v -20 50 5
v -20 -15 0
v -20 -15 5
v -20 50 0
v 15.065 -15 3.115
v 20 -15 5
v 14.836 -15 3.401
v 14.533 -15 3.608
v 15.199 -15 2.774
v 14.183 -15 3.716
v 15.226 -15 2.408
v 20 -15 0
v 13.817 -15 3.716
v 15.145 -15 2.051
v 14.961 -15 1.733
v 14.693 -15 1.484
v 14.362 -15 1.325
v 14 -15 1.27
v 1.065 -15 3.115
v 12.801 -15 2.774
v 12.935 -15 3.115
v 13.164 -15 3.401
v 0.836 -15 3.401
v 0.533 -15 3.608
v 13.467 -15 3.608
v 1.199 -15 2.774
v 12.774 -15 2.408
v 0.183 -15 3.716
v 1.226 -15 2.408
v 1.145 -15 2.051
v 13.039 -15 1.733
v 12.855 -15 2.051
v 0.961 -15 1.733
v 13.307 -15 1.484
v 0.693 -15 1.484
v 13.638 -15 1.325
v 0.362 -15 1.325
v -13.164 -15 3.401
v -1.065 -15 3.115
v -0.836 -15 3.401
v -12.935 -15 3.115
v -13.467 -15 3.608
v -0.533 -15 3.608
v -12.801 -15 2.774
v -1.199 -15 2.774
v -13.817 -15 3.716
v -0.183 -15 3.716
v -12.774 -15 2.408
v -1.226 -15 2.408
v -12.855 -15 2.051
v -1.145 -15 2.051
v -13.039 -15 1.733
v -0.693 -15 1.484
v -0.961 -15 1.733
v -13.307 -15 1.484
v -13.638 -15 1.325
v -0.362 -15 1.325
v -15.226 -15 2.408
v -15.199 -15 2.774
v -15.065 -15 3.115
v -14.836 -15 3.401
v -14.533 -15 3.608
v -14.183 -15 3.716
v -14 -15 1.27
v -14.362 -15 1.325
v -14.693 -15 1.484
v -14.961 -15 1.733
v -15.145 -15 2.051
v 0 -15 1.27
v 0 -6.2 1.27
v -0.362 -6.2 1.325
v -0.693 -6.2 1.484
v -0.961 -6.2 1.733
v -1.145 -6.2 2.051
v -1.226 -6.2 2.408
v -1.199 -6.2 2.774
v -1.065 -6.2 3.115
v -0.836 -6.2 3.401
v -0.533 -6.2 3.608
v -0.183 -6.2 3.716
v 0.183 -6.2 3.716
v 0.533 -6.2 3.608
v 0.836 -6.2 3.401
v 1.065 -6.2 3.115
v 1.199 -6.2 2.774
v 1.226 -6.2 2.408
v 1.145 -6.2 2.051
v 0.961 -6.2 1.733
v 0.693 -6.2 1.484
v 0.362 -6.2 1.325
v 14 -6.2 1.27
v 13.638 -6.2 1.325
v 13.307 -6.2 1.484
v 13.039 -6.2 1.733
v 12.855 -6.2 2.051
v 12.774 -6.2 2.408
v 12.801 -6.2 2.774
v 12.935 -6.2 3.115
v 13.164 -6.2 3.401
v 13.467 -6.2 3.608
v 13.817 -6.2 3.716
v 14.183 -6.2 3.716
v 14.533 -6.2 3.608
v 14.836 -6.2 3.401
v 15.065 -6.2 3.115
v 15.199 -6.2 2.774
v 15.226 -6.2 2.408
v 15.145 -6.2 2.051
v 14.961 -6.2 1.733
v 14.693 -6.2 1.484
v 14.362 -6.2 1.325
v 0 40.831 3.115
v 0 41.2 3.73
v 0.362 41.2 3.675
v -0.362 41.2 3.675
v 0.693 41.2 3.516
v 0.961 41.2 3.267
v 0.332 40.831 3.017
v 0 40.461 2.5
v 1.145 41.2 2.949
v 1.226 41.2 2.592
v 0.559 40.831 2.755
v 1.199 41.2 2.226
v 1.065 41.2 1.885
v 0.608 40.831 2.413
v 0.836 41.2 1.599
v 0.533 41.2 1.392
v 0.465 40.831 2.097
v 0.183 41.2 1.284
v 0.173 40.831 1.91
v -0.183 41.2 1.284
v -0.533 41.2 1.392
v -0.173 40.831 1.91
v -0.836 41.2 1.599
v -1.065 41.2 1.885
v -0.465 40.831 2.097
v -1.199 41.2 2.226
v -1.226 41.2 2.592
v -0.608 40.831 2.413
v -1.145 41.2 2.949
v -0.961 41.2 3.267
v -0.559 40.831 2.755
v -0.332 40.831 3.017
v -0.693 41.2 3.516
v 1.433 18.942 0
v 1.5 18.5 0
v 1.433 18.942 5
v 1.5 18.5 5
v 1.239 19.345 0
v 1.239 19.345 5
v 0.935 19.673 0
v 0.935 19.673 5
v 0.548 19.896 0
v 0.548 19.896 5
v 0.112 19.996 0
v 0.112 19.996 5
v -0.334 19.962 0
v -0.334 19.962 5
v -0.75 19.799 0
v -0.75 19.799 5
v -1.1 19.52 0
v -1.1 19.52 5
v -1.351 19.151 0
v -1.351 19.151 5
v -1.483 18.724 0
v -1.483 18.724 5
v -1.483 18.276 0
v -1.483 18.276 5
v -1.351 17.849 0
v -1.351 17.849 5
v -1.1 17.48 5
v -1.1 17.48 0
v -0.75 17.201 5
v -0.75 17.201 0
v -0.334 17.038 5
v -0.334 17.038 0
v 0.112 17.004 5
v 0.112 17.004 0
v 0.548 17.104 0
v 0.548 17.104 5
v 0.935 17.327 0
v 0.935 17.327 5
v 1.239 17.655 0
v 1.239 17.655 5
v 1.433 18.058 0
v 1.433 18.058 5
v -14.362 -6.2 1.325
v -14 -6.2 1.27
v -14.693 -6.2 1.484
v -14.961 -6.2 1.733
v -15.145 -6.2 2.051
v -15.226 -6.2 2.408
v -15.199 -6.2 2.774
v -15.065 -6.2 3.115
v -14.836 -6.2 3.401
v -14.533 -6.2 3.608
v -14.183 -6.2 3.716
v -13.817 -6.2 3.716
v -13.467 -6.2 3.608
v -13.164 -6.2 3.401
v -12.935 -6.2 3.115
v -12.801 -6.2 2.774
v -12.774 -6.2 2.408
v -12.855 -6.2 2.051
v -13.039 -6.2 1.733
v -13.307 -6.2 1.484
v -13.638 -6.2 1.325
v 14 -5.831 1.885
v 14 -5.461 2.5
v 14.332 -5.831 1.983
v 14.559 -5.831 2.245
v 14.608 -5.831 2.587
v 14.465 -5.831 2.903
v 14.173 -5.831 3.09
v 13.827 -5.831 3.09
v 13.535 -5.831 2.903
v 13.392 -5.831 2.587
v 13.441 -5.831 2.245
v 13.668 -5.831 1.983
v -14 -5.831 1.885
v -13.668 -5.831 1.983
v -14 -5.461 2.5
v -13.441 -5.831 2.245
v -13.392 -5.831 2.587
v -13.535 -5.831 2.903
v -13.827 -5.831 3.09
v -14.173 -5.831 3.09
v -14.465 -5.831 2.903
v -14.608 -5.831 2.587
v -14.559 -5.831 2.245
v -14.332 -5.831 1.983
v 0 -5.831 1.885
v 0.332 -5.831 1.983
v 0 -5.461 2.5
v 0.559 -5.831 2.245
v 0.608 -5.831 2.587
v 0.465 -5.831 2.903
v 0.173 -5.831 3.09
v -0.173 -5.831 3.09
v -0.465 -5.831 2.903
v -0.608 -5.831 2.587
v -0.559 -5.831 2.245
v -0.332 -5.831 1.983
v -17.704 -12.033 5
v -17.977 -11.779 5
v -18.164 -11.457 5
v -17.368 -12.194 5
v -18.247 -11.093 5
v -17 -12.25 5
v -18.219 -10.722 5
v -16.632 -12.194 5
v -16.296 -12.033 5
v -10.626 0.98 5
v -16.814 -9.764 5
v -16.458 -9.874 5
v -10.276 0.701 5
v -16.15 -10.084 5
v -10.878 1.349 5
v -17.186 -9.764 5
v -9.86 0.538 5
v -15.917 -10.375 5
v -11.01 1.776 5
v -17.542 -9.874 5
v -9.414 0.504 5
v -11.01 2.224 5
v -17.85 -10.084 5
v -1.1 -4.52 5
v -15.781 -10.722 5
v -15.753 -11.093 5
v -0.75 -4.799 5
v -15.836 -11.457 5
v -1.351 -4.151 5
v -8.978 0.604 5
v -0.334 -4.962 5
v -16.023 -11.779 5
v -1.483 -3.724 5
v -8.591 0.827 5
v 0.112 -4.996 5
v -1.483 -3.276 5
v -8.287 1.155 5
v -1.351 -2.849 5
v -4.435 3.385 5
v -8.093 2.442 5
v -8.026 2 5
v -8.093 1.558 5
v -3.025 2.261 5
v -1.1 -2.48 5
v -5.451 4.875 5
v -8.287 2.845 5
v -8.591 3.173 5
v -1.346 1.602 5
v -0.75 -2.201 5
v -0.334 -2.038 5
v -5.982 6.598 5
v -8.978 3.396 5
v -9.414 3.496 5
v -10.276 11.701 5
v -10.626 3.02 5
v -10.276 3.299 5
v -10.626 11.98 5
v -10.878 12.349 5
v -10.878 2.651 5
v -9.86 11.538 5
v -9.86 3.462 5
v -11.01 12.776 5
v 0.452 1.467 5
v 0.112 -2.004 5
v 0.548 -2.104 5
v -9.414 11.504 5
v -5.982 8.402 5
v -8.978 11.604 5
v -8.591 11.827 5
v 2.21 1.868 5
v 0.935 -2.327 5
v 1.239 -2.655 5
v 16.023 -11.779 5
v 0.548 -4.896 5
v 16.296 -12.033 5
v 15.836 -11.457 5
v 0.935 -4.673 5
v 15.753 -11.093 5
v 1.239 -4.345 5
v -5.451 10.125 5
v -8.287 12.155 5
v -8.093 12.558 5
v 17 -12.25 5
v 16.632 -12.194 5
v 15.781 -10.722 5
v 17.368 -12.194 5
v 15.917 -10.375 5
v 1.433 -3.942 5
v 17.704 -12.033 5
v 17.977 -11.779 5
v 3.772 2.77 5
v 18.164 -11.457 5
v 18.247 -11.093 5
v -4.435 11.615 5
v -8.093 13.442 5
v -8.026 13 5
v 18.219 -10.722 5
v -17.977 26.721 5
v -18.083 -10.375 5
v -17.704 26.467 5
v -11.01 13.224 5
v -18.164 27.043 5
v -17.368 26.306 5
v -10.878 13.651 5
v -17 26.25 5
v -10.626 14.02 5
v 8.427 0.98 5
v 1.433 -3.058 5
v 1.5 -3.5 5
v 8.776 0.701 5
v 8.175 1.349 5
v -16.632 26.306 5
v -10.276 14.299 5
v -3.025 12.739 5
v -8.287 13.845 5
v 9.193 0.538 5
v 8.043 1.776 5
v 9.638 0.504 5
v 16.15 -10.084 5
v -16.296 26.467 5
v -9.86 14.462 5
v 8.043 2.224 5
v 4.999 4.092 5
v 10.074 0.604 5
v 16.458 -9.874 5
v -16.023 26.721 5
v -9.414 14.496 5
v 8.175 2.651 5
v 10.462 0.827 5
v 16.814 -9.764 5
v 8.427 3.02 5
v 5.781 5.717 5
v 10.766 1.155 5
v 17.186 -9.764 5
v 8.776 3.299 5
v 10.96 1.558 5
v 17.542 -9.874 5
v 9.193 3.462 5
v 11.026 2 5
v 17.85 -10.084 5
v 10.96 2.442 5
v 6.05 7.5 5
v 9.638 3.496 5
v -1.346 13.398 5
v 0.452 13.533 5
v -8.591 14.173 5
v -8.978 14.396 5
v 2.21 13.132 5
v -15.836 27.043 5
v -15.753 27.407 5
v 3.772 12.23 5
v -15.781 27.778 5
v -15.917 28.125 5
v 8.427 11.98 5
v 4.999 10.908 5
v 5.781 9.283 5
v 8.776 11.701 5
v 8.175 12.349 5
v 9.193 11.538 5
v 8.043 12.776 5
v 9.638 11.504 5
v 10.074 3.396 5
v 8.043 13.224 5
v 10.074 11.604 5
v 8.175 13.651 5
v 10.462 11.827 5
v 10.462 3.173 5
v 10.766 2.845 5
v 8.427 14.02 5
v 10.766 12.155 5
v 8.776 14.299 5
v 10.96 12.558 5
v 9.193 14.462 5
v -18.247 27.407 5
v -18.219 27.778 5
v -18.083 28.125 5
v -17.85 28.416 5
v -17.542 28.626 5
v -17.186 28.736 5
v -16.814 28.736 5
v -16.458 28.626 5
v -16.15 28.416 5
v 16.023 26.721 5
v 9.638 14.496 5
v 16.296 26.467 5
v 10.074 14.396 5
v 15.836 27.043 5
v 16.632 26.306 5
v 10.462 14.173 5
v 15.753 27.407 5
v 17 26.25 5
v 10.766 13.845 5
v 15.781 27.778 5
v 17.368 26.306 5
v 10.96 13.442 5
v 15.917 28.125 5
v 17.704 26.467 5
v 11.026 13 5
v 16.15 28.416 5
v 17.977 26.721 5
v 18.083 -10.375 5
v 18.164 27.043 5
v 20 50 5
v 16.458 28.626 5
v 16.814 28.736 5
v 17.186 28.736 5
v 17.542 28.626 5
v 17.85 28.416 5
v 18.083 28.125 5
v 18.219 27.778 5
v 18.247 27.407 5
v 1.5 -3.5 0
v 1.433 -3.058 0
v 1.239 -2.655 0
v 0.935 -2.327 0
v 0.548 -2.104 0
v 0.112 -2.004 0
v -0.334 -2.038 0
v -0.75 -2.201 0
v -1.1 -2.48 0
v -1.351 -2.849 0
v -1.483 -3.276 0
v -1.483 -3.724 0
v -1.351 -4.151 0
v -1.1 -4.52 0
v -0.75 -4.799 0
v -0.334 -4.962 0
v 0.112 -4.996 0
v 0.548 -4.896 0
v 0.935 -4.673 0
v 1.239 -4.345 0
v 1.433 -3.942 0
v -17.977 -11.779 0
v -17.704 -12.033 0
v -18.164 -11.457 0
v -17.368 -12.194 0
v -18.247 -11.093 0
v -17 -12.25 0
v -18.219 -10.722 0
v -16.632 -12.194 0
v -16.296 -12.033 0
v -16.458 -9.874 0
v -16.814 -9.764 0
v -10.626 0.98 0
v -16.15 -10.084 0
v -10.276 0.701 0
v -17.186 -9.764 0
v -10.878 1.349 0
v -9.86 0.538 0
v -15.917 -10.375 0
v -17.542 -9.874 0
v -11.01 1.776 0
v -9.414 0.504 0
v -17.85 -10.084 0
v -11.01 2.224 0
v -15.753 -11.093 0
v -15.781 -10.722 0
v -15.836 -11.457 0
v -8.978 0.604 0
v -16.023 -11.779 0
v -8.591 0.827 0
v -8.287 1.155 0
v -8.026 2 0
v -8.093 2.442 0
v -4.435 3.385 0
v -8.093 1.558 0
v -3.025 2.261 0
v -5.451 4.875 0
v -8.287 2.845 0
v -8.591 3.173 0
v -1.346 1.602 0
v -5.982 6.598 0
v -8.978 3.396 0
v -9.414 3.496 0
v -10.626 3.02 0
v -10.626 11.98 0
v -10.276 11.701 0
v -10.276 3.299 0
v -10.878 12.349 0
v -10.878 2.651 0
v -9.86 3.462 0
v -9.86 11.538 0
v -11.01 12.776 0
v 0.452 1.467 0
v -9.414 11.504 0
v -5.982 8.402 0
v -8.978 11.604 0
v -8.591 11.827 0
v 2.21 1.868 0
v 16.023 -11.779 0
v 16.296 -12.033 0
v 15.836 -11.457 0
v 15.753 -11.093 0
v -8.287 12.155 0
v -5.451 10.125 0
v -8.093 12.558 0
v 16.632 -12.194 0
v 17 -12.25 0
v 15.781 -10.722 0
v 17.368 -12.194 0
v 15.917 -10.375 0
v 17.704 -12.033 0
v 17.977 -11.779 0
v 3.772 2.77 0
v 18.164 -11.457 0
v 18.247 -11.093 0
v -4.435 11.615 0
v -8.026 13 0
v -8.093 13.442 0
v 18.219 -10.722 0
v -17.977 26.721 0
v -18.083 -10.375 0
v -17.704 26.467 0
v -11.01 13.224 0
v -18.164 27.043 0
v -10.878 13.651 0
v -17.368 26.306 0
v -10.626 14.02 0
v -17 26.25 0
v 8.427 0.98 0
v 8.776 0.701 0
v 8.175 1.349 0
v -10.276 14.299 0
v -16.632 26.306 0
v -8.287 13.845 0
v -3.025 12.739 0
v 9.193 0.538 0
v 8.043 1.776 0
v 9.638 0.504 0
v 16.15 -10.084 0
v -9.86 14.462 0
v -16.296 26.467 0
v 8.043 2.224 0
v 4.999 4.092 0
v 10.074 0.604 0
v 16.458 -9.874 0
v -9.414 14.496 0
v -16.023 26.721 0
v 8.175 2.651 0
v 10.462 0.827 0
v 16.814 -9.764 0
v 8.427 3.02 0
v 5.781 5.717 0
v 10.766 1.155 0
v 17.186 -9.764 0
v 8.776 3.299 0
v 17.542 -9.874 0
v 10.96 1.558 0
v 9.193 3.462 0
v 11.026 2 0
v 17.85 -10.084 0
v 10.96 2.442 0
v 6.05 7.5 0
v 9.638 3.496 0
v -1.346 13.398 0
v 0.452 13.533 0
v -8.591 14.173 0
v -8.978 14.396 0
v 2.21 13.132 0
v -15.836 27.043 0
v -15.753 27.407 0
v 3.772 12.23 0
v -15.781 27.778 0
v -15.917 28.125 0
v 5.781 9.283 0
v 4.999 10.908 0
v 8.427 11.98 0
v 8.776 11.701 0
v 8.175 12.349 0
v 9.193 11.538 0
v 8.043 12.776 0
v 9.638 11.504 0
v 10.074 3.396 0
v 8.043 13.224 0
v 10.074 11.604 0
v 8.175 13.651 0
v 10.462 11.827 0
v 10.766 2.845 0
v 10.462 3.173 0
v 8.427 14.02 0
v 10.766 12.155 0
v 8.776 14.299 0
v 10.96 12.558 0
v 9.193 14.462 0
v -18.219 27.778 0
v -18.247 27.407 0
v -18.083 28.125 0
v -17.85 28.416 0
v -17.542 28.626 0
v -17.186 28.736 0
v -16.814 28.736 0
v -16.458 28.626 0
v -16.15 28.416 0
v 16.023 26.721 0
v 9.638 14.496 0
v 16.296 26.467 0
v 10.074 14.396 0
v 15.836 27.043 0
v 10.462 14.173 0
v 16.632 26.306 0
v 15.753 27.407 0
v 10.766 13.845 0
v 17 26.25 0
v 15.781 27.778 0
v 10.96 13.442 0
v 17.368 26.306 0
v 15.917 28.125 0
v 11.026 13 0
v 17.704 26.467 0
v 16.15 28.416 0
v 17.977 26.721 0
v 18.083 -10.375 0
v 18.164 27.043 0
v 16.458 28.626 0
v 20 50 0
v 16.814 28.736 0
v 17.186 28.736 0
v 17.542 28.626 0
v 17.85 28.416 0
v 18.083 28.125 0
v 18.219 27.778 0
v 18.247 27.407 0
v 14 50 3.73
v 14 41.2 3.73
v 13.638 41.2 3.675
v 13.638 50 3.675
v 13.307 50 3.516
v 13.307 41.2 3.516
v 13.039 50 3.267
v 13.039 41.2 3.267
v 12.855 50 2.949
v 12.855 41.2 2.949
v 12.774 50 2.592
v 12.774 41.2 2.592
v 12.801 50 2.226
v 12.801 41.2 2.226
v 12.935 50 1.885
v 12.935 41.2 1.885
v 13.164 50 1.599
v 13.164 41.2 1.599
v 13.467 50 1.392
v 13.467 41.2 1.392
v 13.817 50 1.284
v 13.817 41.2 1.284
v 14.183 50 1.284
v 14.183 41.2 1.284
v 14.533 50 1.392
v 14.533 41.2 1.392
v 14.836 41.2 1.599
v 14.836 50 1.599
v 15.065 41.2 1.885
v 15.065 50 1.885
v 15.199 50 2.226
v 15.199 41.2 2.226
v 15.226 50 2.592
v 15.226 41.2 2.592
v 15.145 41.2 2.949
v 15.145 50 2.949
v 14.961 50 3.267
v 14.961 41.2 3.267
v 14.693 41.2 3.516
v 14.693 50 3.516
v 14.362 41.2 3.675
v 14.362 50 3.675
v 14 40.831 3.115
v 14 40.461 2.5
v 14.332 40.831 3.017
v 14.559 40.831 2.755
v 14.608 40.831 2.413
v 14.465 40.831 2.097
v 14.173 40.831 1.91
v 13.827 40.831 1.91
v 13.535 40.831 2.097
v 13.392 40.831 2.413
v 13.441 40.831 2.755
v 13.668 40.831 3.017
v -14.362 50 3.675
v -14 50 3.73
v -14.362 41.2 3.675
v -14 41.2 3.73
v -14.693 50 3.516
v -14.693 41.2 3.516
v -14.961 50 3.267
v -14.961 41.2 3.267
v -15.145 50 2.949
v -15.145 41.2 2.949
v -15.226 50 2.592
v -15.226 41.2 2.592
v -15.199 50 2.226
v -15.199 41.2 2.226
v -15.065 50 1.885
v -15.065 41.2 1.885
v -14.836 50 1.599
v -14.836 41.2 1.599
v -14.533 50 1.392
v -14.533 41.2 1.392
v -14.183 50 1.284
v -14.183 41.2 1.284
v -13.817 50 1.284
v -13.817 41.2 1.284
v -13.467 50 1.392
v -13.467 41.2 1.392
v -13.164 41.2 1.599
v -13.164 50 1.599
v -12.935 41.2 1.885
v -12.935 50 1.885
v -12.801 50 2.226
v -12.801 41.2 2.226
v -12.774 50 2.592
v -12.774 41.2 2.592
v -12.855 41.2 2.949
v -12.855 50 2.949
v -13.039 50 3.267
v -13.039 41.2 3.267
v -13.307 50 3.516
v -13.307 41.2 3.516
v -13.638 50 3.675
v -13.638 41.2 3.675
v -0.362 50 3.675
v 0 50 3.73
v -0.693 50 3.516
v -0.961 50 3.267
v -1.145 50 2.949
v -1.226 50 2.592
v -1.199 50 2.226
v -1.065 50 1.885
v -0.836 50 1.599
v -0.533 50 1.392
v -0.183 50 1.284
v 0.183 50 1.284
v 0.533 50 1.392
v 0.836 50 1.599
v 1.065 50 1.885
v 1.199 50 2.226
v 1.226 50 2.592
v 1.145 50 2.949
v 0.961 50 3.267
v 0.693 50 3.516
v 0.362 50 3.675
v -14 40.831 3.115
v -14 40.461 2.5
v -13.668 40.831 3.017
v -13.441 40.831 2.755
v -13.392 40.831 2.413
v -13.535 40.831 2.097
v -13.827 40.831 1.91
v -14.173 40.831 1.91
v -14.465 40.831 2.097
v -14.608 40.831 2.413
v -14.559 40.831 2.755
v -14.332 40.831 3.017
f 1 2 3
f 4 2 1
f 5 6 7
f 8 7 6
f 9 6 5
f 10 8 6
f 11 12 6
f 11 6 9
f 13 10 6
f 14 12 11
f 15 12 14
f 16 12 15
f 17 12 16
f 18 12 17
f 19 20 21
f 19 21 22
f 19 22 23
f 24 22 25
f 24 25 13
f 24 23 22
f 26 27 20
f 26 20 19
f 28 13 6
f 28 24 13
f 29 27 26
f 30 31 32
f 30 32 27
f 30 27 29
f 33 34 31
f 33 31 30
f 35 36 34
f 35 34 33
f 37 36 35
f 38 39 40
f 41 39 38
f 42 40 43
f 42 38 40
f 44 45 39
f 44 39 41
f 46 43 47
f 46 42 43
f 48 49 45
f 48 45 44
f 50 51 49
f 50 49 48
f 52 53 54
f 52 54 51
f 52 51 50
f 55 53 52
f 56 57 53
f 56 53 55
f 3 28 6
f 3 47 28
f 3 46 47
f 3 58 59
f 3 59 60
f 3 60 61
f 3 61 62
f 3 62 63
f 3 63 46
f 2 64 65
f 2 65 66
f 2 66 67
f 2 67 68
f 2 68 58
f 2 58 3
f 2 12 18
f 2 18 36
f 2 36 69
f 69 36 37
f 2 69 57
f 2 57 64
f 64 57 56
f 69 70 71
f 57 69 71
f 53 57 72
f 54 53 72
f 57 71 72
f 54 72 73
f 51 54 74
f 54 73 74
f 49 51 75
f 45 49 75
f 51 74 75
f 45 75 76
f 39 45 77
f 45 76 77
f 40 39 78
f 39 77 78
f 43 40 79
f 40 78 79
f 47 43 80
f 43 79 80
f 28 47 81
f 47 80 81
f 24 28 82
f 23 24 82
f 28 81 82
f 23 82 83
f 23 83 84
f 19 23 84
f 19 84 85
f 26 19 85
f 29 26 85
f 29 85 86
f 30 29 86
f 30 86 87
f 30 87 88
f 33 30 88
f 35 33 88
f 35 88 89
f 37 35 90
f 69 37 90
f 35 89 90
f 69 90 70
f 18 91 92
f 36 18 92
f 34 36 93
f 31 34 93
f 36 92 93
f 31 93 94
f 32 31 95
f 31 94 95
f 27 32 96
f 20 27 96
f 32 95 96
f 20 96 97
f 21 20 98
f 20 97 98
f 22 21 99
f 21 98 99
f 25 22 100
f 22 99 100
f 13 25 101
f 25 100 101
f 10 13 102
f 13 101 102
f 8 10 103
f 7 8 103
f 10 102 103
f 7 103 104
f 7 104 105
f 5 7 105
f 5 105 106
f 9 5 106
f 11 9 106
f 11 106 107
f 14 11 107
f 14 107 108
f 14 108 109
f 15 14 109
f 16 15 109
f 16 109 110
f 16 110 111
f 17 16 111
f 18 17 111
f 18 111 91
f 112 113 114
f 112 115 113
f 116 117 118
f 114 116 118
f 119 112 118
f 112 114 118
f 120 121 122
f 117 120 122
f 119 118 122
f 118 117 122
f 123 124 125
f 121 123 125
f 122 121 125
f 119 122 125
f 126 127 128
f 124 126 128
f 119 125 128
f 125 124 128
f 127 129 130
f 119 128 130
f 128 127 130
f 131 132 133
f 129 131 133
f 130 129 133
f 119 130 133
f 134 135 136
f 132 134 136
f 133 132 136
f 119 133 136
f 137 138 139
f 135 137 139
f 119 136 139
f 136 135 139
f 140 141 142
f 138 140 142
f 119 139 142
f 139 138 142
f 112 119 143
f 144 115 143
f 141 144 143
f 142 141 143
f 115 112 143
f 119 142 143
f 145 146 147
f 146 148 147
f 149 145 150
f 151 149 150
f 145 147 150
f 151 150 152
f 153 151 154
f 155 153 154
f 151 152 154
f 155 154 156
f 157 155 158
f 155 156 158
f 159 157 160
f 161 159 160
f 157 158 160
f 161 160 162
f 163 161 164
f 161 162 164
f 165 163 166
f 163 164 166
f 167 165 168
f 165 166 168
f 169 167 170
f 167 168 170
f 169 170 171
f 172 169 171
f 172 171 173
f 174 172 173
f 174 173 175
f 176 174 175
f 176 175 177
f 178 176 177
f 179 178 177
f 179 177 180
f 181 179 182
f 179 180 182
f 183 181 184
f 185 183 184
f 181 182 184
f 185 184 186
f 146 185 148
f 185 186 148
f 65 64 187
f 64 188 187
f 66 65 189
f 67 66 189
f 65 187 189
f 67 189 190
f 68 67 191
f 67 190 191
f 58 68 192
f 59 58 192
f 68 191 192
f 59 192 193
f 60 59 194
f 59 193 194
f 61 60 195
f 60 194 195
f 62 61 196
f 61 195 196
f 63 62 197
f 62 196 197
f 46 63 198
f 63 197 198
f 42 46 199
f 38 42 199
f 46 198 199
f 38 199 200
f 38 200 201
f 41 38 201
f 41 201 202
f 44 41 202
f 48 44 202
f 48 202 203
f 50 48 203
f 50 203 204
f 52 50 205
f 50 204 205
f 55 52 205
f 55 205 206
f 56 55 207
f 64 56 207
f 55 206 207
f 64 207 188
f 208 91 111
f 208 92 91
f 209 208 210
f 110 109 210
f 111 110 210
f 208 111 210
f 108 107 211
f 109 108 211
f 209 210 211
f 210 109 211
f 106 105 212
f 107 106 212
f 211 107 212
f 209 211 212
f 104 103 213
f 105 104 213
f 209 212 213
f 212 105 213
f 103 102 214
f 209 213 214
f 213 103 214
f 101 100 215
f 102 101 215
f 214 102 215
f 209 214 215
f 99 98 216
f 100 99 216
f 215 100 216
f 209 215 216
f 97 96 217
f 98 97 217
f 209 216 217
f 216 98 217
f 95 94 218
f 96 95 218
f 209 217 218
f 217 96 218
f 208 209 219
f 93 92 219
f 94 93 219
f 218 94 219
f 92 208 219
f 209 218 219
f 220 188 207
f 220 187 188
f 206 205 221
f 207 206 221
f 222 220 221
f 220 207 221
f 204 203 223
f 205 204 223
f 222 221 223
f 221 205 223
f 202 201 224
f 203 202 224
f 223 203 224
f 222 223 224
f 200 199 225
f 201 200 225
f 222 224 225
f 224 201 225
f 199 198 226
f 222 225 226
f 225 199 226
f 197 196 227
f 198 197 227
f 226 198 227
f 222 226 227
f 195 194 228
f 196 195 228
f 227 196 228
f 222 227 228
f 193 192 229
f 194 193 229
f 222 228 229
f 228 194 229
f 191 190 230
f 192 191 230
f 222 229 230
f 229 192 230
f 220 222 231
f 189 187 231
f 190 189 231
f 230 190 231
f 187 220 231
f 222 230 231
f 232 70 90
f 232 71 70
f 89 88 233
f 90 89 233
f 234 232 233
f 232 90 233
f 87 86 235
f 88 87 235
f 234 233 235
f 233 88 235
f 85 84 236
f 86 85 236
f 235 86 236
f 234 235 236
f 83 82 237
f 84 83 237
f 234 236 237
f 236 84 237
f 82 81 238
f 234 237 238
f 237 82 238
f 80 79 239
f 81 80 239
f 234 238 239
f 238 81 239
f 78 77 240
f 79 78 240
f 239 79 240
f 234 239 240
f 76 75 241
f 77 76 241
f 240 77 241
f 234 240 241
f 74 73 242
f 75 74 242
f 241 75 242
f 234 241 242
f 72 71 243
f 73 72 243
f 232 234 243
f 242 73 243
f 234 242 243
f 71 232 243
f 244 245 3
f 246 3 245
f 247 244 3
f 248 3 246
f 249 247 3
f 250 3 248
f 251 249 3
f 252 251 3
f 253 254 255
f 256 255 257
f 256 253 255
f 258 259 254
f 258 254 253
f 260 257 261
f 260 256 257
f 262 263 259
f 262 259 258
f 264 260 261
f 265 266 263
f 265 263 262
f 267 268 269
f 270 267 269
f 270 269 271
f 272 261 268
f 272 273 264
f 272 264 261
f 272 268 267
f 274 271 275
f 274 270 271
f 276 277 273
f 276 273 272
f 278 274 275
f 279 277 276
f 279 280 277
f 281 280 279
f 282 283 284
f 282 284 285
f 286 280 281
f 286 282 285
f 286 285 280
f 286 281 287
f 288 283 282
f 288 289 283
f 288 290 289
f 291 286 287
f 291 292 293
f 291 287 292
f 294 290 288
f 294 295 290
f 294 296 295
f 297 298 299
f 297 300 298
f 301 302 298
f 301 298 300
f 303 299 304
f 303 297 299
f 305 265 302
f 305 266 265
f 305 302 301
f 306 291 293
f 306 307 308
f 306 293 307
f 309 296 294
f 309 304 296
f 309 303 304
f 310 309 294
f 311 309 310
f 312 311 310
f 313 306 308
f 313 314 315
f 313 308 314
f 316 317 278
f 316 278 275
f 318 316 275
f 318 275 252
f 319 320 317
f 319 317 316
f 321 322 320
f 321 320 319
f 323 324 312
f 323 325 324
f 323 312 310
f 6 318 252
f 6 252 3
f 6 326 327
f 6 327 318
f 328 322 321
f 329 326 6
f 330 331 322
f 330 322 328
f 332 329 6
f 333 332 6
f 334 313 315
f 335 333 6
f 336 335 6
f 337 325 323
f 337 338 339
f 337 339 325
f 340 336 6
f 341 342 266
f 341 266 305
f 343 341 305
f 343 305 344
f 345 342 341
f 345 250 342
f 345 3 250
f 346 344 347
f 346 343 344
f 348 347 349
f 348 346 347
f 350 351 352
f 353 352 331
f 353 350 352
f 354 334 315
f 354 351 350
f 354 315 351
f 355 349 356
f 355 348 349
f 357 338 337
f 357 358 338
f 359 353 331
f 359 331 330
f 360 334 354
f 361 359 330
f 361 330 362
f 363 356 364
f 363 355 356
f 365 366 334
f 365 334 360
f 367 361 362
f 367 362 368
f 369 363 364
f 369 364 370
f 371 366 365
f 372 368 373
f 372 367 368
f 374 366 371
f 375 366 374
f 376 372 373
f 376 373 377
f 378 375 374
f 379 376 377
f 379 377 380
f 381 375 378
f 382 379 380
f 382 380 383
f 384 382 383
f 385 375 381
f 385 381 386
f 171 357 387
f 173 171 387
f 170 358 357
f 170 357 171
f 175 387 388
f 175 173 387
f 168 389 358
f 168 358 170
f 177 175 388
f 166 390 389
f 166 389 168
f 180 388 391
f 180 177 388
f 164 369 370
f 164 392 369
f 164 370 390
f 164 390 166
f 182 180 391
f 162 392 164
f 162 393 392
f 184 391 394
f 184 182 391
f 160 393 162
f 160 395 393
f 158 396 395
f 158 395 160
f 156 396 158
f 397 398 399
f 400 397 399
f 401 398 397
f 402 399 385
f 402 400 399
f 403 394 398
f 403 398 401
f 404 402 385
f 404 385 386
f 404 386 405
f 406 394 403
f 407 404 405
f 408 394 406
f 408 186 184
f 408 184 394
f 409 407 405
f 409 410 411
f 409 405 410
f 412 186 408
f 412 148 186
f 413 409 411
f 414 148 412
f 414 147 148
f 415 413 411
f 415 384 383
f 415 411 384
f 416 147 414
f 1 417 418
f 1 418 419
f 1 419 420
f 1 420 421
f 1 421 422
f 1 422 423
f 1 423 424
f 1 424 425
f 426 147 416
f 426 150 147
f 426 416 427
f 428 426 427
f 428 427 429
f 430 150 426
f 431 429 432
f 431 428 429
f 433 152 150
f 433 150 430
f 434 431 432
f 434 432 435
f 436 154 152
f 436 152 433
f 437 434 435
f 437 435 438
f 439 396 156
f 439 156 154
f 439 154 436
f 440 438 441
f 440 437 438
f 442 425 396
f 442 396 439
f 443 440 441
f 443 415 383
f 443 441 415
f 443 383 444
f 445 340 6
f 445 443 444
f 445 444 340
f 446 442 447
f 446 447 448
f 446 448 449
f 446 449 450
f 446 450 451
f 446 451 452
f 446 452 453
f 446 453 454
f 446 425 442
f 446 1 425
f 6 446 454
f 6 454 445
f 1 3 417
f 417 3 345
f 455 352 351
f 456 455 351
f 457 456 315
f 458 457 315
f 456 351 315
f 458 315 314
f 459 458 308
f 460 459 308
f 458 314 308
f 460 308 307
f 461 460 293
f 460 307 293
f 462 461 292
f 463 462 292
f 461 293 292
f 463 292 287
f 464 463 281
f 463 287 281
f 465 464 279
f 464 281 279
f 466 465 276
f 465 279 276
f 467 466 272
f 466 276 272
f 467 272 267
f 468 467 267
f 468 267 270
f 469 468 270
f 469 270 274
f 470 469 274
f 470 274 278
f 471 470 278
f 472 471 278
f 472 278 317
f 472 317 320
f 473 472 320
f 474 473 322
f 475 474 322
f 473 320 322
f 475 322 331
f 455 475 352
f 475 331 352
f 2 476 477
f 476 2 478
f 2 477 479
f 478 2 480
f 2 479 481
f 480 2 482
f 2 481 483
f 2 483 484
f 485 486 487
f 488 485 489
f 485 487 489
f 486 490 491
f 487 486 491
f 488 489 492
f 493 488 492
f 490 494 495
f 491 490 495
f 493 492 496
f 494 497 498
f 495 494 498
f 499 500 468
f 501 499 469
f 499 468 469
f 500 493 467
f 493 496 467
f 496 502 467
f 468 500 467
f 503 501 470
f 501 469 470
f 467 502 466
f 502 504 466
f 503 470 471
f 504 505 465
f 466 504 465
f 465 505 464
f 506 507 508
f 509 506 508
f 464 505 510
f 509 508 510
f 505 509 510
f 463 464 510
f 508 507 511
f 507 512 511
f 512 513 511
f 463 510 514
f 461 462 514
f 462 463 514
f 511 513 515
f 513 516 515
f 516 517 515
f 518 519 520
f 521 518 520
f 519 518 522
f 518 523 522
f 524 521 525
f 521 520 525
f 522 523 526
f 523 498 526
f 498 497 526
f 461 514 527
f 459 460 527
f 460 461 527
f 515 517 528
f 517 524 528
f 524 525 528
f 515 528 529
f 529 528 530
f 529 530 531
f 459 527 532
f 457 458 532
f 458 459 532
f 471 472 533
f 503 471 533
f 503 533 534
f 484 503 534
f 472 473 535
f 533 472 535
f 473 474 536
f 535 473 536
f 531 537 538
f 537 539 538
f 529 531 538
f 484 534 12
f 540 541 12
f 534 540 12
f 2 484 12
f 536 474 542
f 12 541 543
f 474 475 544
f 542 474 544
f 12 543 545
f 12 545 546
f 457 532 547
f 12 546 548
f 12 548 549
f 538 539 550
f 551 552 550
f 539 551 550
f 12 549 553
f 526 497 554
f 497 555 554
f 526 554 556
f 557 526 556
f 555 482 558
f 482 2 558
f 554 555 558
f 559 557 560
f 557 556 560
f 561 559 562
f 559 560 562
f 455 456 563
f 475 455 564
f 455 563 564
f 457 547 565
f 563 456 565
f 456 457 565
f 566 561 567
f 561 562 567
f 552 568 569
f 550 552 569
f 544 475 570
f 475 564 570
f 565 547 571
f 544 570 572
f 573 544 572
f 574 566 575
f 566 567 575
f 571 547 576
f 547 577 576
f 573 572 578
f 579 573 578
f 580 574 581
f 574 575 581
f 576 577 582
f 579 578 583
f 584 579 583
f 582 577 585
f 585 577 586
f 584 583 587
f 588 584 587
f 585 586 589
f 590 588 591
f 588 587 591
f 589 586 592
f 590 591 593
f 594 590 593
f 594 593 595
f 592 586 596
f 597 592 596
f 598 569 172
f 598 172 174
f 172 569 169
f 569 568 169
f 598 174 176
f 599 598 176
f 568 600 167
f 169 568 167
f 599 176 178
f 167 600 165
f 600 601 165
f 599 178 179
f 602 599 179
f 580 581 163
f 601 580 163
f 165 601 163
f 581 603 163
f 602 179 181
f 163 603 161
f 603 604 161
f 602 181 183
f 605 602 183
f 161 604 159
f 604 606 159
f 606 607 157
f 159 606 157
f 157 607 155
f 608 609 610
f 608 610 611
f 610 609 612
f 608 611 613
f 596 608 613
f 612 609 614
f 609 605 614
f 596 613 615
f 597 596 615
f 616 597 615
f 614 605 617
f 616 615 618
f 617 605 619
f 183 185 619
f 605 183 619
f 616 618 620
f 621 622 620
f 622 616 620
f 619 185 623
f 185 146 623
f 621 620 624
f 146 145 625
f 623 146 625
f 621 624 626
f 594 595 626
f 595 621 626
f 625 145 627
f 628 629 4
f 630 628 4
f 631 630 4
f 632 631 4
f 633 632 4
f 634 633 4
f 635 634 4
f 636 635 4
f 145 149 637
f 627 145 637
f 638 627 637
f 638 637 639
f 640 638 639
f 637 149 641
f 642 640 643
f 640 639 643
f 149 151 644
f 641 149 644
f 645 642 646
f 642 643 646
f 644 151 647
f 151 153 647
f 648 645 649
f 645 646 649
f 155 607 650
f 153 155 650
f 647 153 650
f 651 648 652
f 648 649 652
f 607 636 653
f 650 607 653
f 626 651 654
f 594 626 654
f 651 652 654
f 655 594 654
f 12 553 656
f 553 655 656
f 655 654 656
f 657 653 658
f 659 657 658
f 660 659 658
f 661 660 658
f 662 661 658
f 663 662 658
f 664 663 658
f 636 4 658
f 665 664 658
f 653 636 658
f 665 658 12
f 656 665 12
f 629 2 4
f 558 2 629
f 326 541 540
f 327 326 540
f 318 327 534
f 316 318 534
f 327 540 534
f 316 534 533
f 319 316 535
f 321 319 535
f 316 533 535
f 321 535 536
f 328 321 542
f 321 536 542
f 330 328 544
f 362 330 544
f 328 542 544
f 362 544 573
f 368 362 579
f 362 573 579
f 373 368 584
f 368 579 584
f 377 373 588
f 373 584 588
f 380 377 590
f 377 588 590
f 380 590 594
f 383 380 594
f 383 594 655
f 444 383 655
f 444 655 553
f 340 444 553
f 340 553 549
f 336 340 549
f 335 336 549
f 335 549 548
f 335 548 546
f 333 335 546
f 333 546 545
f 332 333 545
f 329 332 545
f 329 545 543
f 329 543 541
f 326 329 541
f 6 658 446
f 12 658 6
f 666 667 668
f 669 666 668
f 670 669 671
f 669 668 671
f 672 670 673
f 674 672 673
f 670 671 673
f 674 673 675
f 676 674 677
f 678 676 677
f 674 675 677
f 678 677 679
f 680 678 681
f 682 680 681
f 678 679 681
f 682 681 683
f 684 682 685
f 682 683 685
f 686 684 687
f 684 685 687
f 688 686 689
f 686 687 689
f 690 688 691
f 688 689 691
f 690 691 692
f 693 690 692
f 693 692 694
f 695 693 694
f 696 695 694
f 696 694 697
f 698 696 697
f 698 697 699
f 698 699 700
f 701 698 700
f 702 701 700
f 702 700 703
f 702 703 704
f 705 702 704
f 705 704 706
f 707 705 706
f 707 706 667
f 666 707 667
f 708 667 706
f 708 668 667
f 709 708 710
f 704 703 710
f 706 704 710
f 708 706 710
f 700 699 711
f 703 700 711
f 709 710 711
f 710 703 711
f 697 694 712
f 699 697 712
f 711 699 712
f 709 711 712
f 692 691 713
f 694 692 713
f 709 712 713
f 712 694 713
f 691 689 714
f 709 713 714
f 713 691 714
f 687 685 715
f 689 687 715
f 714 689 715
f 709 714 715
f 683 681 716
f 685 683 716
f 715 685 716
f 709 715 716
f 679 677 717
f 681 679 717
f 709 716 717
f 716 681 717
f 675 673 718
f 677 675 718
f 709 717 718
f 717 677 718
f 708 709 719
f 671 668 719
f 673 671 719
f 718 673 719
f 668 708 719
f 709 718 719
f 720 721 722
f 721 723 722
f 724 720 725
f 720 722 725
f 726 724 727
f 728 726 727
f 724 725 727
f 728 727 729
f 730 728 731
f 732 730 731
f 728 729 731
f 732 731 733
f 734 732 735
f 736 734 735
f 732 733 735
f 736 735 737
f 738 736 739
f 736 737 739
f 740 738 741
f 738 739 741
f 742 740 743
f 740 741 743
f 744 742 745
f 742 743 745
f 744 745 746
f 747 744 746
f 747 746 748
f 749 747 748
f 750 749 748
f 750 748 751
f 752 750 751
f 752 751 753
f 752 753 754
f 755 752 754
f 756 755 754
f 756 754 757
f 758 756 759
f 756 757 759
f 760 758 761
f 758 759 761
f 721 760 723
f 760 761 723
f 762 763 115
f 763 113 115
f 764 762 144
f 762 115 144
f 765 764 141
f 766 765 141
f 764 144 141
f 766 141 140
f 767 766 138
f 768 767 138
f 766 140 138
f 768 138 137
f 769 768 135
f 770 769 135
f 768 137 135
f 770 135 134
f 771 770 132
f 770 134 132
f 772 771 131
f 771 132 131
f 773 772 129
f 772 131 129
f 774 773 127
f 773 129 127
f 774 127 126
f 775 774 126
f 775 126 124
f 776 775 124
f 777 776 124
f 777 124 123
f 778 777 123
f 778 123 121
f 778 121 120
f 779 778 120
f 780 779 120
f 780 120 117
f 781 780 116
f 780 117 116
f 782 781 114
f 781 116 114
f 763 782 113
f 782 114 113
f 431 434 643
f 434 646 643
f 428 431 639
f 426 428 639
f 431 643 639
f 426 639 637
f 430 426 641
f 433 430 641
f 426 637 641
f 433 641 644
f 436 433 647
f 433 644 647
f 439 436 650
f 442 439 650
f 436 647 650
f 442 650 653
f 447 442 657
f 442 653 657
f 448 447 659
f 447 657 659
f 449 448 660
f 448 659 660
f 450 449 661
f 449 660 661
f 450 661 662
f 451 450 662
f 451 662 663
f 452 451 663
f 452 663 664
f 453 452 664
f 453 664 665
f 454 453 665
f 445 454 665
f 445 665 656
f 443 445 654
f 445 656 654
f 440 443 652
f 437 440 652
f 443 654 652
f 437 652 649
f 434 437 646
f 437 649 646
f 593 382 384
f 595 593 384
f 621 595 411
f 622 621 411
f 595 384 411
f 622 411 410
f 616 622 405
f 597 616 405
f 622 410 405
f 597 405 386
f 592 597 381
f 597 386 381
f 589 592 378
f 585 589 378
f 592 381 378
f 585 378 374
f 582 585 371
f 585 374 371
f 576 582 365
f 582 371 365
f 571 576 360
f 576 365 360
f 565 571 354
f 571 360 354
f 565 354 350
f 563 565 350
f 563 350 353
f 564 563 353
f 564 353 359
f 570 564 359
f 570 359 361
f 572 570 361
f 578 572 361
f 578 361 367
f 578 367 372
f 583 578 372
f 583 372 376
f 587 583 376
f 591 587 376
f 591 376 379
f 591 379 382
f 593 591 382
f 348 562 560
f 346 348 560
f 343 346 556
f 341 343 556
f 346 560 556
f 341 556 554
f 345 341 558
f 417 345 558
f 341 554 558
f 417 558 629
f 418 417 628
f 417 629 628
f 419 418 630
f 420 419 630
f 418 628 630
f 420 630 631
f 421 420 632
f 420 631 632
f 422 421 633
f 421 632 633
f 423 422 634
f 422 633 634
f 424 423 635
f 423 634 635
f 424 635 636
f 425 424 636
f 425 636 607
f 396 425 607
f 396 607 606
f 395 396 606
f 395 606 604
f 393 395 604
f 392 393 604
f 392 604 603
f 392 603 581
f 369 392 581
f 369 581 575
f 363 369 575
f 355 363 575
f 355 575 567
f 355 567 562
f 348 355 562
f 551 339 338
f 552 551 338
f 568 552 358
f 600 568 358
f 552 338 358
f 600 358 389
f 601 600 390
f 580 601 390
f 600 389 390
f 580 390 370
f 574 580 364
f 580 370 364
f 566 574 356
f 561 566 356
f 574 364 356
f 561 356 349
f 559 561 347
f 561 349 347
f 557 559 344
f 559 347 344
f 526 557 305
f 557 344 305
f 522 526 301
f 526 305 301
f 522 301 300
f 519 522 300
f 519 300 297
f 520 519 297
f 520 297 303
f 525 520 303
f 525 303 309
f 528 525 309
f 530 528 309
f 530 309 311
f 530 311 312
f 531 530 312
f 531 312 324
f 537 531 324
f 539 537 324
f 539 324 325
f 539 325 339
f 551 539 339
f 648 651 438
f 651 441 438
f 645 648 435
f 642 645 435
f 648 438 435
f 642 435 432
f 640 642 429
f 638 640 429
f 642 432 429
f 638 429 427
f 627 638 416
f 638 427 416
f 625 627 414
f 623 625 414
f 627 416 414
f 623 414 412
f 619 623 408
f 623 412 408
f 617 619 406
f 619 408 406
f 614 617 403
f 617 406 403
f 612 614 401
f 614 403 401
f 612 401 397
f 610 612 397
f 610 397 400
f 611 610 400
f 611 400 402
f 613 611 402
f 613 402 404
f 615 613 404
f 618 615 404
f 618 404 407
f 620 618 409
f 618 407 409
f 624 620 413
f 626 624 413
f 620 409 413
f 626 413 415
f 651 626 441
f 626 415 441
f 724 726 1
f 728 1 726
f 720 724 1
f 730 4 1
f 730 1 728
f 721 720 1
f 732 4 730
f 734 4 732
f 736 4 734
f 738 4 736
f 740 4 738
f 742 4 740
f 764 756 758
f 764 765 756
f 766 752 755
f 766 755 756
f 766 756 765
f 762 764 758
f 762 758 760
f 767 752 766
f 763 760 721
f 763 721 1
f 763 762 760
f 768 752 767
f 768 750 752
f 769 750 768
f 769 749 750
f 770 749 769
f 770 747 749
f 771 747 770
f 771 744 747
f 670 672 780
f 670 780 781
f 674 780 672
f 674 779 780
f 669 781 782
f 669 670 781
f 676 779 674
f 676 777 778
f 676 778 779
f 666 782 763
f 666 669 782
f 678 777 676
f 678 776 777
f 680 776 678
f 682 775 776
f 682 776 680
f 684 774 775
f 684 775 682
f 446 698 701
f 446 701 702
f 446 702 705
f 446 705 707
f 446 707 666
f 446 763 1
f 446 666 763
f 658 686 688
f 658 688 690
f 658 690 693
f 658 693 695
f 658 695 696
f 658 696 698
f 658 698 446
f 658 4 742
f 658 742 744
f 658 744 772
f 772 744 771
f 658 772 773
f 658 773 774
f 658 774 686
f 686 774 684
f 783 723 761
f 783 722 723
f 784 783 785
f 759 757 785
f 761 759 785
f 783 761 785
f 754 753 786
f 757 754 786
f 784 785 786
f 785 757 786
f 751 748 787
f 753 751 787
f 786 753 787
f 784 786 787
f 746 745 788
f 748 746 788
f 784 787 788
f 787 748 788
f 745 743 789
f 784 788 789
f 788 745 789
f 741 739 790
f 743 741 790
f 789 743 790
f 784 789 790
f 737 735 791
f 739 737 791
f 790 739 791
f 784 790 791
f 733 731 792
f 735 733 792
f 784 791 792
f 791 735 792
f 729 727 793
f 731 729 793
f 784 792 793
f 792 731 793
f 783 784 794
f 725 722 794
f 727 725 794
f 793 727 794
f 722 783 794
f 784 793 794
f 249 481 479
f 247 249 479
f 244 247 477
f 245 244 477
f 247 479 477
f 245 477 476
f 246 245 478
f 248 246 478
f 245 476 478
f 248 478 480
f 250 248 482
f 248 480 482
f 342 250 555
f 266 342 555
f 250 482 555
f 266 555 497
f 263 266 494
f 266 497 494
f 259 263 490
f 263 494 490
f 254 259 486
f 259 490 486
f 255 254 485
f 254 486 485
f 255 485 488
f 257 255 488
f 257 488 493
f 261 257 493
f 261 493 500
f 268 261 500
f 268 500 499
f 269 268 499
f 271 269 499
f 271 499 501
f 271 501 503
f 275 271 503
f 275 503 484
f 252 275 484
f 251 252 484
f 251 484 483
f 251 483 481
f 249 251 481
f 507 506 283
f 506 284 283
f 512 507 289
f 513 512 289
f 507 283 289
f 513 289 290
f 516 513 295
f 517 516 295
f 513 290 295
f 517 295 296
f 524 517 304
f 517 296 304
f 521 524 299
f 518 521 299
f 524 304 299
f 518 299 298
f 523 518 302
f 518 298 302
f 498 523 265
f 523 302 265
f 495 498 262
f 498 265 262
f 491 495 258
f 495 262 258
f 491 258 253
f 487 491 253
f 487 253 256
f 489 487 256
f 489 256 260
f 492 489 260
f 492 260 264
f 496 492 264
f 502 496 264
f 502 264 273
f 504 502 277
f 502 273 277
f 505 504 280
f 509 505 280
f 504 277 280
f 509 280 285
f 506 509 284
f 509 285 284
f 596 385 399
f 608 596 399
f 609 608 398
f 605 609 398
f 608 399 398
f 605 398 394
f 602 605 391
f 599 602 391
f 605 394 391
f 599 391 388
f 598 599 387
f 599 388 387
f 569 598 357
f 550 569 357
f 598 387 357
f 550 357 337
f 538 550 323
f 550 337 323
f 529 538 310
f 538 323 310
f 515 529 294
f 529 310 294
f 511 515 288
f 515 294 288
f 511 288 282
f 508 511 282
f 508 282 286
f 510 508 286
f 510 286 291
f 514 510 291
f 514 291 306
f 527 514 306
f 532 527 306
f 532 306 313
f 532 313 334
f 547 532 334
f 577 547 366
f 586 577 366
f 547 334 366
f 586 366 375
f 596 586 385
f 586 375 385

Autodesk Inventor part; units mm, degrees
ref_plane "YZ Plane" through (0, 0, 0) normal (1, 0, 0) x (0, 1, 0)
ref_plane "XZ Plane" through (0, 0, 0) normal (0, 1, 0) x (-1, 0, 0)
ref_plane "XY Plane" through (0, 0, 0) normal (0, 0, 1) x (1, 0, 0)
sketch "Sketch1" plane through (0, 0, 0) normal (0, 0, 1) x (1, 0, 0)
  line L0 (20, -15) -> (-20, -15)
  line L1 (-20, -15) -> (-20, 50)
  line L2 (-20, 50) -> (20, 50)
  line L3 (20, 50) -> (20, -15)
  point P0 (0, 0)
  dimension "d0" = 40
  dimension "d1" = 65
  dimension "d27" = 15
  dimension "d28" = 20
extrude "Extrusion1" add sketch "Sketch1" along normal blind 5
sketch "Sketch5" plane through (-20, -15, 0) normal (0, -1, 0) x (1, 0, 0)
  line L0 (20, 0) -> (20, 7.6333) construction
  line L1 (0, 0) -> (0, 5) construction
  line L2 (0, 2.5) -> (40, 2.5) construction
  line L3 (40, 0) -> (40, 5) construction
  line L4 (20, 0) -> (20, 7.6333) construction
  line L5 (0, 5) -> (40, 5) construction
  point P0 (20, 2.5)
  point P1 (6, 2.5)
  point P2 (34, 2.5)
  dimension "d29" = 14
hole "Hole3" at (0, -15, 2.5) at (-14, -15, 2.5) at (14, -15, 2.5) direction (0, 1, 0) diameter 2.459 depth 8.8 tip angle 118 thread size "M3x0.5" class "6H" standard "ISO Metric profile"
sketch "Sketch6" plane through (0, 0, 5) normal (0, 0, 1) x (1, 0, 0)
  line L0 (-39.4918, 7.5) -> (40.0477, 7.5) construction
  line L1 (-20, -15) -> (20, -15) construction
  line L2 (20, -15) -> (20, 50) construction
  line L3 (20, 50) -> (-20, 50) construction
  line L4 (-20, 50) -> (-20, -15) construction
  circle A0 centre (0, 7.5) radius 6.05
  line L5 (0, 63) -> (0, -28) construction
  circle A1 centre (0, 7.5) radius 11 construction
  circle A2 centre (0, -3.5) radius 1.5
  circle A3 centre (9.5263, 2) radius 1.5
  circle A4 centre (9.5263, 13) radius 1.5
  circle A5 centre (0, 18.5) radius 1.5
  circle A6 centre (-9.5263, 13) radius 1.5
  circle A7 centre (-9.5263, 2) radius 1.5
  point P0 (0, 0)
  dimension "d40" = 22
  dimension "d38" = 22.5
  dimension "d39" = 12.1
  dimension "d41" = 3
  dimension "d44" = 360
extrude "Extrusion3" cut sketch "Sketch6" against normal through all
sketch "Sketch7" plane through (0, 0, 5) normal (0, 0, 1) x (1, 0, 0)
  circle A0 centre (0, 7.5) radius 7.05
  circle A1 centre (0, 7.5) radius 6.05 projected
  point P0 (0, 0)
  dimension "d48" = 1
extrude "Extrusion4" [suppressed]
sketch "Sketch8" plane through (-20, 50, 0) normal (0, 1, 0) x (1, 0, 0)
  circle A0 centre (6, -2.5) radius 1.2295 construction
  circle A1 centre (20, -2.5) radius 1.2295 construction
  circle A2 centre (34, -2.5) radius 1.2295 construction
  point P0 (20, 0)
hole "Hole4" at (14, 50, 2.5) at (0, 50, 2.5) at (-14, 50, 2.5) direction (0, -1, 0) diameter 2.459 depth 8.8 tip angle 118 thread size "M3x0.5" class "6H" standard "ANSI Metric M Profile"
sketch "Sketch9" plane through (0, 0, 5) normal (0, 0, 1) x (1, 0, 0)
  line L0 (17, -11) -> (-17, -11) construction
  line L1 (-17, -11) -> (-17, 27.5) construction
  line L2 (-17, 27.5) -> (17, 27.5) construction
  line L3 (17, 27.5) -> (17, -11) construction
  line L4 (17, -11) -> (-17, 27.5) construction
  line L5 (-17, -11) -> (17, 27.5) construction
  line L6 (-20, -15) -> (20, -15) construction
  line L7 (0, 63) -> (0, -28) construction
  point P0 (0, 0)
  point P1 (0, 8.25)
  dimension "d31" = 6
  dimension "d58" = 34
  dimension "d59" = 38.5
  dimension "d60" = 4
hole "Hole5" at (-17, 27.5, 5) at (17, 27.5, 5) at (17, -11, 5) at (-17, -11, 5) direction (0, 0, -1) diameter 2.5 end through all
equation "\"d28\" = 0.5 * d0"
properties part number "wheel_fix_plate_collet" material "Aluminum 6061"
